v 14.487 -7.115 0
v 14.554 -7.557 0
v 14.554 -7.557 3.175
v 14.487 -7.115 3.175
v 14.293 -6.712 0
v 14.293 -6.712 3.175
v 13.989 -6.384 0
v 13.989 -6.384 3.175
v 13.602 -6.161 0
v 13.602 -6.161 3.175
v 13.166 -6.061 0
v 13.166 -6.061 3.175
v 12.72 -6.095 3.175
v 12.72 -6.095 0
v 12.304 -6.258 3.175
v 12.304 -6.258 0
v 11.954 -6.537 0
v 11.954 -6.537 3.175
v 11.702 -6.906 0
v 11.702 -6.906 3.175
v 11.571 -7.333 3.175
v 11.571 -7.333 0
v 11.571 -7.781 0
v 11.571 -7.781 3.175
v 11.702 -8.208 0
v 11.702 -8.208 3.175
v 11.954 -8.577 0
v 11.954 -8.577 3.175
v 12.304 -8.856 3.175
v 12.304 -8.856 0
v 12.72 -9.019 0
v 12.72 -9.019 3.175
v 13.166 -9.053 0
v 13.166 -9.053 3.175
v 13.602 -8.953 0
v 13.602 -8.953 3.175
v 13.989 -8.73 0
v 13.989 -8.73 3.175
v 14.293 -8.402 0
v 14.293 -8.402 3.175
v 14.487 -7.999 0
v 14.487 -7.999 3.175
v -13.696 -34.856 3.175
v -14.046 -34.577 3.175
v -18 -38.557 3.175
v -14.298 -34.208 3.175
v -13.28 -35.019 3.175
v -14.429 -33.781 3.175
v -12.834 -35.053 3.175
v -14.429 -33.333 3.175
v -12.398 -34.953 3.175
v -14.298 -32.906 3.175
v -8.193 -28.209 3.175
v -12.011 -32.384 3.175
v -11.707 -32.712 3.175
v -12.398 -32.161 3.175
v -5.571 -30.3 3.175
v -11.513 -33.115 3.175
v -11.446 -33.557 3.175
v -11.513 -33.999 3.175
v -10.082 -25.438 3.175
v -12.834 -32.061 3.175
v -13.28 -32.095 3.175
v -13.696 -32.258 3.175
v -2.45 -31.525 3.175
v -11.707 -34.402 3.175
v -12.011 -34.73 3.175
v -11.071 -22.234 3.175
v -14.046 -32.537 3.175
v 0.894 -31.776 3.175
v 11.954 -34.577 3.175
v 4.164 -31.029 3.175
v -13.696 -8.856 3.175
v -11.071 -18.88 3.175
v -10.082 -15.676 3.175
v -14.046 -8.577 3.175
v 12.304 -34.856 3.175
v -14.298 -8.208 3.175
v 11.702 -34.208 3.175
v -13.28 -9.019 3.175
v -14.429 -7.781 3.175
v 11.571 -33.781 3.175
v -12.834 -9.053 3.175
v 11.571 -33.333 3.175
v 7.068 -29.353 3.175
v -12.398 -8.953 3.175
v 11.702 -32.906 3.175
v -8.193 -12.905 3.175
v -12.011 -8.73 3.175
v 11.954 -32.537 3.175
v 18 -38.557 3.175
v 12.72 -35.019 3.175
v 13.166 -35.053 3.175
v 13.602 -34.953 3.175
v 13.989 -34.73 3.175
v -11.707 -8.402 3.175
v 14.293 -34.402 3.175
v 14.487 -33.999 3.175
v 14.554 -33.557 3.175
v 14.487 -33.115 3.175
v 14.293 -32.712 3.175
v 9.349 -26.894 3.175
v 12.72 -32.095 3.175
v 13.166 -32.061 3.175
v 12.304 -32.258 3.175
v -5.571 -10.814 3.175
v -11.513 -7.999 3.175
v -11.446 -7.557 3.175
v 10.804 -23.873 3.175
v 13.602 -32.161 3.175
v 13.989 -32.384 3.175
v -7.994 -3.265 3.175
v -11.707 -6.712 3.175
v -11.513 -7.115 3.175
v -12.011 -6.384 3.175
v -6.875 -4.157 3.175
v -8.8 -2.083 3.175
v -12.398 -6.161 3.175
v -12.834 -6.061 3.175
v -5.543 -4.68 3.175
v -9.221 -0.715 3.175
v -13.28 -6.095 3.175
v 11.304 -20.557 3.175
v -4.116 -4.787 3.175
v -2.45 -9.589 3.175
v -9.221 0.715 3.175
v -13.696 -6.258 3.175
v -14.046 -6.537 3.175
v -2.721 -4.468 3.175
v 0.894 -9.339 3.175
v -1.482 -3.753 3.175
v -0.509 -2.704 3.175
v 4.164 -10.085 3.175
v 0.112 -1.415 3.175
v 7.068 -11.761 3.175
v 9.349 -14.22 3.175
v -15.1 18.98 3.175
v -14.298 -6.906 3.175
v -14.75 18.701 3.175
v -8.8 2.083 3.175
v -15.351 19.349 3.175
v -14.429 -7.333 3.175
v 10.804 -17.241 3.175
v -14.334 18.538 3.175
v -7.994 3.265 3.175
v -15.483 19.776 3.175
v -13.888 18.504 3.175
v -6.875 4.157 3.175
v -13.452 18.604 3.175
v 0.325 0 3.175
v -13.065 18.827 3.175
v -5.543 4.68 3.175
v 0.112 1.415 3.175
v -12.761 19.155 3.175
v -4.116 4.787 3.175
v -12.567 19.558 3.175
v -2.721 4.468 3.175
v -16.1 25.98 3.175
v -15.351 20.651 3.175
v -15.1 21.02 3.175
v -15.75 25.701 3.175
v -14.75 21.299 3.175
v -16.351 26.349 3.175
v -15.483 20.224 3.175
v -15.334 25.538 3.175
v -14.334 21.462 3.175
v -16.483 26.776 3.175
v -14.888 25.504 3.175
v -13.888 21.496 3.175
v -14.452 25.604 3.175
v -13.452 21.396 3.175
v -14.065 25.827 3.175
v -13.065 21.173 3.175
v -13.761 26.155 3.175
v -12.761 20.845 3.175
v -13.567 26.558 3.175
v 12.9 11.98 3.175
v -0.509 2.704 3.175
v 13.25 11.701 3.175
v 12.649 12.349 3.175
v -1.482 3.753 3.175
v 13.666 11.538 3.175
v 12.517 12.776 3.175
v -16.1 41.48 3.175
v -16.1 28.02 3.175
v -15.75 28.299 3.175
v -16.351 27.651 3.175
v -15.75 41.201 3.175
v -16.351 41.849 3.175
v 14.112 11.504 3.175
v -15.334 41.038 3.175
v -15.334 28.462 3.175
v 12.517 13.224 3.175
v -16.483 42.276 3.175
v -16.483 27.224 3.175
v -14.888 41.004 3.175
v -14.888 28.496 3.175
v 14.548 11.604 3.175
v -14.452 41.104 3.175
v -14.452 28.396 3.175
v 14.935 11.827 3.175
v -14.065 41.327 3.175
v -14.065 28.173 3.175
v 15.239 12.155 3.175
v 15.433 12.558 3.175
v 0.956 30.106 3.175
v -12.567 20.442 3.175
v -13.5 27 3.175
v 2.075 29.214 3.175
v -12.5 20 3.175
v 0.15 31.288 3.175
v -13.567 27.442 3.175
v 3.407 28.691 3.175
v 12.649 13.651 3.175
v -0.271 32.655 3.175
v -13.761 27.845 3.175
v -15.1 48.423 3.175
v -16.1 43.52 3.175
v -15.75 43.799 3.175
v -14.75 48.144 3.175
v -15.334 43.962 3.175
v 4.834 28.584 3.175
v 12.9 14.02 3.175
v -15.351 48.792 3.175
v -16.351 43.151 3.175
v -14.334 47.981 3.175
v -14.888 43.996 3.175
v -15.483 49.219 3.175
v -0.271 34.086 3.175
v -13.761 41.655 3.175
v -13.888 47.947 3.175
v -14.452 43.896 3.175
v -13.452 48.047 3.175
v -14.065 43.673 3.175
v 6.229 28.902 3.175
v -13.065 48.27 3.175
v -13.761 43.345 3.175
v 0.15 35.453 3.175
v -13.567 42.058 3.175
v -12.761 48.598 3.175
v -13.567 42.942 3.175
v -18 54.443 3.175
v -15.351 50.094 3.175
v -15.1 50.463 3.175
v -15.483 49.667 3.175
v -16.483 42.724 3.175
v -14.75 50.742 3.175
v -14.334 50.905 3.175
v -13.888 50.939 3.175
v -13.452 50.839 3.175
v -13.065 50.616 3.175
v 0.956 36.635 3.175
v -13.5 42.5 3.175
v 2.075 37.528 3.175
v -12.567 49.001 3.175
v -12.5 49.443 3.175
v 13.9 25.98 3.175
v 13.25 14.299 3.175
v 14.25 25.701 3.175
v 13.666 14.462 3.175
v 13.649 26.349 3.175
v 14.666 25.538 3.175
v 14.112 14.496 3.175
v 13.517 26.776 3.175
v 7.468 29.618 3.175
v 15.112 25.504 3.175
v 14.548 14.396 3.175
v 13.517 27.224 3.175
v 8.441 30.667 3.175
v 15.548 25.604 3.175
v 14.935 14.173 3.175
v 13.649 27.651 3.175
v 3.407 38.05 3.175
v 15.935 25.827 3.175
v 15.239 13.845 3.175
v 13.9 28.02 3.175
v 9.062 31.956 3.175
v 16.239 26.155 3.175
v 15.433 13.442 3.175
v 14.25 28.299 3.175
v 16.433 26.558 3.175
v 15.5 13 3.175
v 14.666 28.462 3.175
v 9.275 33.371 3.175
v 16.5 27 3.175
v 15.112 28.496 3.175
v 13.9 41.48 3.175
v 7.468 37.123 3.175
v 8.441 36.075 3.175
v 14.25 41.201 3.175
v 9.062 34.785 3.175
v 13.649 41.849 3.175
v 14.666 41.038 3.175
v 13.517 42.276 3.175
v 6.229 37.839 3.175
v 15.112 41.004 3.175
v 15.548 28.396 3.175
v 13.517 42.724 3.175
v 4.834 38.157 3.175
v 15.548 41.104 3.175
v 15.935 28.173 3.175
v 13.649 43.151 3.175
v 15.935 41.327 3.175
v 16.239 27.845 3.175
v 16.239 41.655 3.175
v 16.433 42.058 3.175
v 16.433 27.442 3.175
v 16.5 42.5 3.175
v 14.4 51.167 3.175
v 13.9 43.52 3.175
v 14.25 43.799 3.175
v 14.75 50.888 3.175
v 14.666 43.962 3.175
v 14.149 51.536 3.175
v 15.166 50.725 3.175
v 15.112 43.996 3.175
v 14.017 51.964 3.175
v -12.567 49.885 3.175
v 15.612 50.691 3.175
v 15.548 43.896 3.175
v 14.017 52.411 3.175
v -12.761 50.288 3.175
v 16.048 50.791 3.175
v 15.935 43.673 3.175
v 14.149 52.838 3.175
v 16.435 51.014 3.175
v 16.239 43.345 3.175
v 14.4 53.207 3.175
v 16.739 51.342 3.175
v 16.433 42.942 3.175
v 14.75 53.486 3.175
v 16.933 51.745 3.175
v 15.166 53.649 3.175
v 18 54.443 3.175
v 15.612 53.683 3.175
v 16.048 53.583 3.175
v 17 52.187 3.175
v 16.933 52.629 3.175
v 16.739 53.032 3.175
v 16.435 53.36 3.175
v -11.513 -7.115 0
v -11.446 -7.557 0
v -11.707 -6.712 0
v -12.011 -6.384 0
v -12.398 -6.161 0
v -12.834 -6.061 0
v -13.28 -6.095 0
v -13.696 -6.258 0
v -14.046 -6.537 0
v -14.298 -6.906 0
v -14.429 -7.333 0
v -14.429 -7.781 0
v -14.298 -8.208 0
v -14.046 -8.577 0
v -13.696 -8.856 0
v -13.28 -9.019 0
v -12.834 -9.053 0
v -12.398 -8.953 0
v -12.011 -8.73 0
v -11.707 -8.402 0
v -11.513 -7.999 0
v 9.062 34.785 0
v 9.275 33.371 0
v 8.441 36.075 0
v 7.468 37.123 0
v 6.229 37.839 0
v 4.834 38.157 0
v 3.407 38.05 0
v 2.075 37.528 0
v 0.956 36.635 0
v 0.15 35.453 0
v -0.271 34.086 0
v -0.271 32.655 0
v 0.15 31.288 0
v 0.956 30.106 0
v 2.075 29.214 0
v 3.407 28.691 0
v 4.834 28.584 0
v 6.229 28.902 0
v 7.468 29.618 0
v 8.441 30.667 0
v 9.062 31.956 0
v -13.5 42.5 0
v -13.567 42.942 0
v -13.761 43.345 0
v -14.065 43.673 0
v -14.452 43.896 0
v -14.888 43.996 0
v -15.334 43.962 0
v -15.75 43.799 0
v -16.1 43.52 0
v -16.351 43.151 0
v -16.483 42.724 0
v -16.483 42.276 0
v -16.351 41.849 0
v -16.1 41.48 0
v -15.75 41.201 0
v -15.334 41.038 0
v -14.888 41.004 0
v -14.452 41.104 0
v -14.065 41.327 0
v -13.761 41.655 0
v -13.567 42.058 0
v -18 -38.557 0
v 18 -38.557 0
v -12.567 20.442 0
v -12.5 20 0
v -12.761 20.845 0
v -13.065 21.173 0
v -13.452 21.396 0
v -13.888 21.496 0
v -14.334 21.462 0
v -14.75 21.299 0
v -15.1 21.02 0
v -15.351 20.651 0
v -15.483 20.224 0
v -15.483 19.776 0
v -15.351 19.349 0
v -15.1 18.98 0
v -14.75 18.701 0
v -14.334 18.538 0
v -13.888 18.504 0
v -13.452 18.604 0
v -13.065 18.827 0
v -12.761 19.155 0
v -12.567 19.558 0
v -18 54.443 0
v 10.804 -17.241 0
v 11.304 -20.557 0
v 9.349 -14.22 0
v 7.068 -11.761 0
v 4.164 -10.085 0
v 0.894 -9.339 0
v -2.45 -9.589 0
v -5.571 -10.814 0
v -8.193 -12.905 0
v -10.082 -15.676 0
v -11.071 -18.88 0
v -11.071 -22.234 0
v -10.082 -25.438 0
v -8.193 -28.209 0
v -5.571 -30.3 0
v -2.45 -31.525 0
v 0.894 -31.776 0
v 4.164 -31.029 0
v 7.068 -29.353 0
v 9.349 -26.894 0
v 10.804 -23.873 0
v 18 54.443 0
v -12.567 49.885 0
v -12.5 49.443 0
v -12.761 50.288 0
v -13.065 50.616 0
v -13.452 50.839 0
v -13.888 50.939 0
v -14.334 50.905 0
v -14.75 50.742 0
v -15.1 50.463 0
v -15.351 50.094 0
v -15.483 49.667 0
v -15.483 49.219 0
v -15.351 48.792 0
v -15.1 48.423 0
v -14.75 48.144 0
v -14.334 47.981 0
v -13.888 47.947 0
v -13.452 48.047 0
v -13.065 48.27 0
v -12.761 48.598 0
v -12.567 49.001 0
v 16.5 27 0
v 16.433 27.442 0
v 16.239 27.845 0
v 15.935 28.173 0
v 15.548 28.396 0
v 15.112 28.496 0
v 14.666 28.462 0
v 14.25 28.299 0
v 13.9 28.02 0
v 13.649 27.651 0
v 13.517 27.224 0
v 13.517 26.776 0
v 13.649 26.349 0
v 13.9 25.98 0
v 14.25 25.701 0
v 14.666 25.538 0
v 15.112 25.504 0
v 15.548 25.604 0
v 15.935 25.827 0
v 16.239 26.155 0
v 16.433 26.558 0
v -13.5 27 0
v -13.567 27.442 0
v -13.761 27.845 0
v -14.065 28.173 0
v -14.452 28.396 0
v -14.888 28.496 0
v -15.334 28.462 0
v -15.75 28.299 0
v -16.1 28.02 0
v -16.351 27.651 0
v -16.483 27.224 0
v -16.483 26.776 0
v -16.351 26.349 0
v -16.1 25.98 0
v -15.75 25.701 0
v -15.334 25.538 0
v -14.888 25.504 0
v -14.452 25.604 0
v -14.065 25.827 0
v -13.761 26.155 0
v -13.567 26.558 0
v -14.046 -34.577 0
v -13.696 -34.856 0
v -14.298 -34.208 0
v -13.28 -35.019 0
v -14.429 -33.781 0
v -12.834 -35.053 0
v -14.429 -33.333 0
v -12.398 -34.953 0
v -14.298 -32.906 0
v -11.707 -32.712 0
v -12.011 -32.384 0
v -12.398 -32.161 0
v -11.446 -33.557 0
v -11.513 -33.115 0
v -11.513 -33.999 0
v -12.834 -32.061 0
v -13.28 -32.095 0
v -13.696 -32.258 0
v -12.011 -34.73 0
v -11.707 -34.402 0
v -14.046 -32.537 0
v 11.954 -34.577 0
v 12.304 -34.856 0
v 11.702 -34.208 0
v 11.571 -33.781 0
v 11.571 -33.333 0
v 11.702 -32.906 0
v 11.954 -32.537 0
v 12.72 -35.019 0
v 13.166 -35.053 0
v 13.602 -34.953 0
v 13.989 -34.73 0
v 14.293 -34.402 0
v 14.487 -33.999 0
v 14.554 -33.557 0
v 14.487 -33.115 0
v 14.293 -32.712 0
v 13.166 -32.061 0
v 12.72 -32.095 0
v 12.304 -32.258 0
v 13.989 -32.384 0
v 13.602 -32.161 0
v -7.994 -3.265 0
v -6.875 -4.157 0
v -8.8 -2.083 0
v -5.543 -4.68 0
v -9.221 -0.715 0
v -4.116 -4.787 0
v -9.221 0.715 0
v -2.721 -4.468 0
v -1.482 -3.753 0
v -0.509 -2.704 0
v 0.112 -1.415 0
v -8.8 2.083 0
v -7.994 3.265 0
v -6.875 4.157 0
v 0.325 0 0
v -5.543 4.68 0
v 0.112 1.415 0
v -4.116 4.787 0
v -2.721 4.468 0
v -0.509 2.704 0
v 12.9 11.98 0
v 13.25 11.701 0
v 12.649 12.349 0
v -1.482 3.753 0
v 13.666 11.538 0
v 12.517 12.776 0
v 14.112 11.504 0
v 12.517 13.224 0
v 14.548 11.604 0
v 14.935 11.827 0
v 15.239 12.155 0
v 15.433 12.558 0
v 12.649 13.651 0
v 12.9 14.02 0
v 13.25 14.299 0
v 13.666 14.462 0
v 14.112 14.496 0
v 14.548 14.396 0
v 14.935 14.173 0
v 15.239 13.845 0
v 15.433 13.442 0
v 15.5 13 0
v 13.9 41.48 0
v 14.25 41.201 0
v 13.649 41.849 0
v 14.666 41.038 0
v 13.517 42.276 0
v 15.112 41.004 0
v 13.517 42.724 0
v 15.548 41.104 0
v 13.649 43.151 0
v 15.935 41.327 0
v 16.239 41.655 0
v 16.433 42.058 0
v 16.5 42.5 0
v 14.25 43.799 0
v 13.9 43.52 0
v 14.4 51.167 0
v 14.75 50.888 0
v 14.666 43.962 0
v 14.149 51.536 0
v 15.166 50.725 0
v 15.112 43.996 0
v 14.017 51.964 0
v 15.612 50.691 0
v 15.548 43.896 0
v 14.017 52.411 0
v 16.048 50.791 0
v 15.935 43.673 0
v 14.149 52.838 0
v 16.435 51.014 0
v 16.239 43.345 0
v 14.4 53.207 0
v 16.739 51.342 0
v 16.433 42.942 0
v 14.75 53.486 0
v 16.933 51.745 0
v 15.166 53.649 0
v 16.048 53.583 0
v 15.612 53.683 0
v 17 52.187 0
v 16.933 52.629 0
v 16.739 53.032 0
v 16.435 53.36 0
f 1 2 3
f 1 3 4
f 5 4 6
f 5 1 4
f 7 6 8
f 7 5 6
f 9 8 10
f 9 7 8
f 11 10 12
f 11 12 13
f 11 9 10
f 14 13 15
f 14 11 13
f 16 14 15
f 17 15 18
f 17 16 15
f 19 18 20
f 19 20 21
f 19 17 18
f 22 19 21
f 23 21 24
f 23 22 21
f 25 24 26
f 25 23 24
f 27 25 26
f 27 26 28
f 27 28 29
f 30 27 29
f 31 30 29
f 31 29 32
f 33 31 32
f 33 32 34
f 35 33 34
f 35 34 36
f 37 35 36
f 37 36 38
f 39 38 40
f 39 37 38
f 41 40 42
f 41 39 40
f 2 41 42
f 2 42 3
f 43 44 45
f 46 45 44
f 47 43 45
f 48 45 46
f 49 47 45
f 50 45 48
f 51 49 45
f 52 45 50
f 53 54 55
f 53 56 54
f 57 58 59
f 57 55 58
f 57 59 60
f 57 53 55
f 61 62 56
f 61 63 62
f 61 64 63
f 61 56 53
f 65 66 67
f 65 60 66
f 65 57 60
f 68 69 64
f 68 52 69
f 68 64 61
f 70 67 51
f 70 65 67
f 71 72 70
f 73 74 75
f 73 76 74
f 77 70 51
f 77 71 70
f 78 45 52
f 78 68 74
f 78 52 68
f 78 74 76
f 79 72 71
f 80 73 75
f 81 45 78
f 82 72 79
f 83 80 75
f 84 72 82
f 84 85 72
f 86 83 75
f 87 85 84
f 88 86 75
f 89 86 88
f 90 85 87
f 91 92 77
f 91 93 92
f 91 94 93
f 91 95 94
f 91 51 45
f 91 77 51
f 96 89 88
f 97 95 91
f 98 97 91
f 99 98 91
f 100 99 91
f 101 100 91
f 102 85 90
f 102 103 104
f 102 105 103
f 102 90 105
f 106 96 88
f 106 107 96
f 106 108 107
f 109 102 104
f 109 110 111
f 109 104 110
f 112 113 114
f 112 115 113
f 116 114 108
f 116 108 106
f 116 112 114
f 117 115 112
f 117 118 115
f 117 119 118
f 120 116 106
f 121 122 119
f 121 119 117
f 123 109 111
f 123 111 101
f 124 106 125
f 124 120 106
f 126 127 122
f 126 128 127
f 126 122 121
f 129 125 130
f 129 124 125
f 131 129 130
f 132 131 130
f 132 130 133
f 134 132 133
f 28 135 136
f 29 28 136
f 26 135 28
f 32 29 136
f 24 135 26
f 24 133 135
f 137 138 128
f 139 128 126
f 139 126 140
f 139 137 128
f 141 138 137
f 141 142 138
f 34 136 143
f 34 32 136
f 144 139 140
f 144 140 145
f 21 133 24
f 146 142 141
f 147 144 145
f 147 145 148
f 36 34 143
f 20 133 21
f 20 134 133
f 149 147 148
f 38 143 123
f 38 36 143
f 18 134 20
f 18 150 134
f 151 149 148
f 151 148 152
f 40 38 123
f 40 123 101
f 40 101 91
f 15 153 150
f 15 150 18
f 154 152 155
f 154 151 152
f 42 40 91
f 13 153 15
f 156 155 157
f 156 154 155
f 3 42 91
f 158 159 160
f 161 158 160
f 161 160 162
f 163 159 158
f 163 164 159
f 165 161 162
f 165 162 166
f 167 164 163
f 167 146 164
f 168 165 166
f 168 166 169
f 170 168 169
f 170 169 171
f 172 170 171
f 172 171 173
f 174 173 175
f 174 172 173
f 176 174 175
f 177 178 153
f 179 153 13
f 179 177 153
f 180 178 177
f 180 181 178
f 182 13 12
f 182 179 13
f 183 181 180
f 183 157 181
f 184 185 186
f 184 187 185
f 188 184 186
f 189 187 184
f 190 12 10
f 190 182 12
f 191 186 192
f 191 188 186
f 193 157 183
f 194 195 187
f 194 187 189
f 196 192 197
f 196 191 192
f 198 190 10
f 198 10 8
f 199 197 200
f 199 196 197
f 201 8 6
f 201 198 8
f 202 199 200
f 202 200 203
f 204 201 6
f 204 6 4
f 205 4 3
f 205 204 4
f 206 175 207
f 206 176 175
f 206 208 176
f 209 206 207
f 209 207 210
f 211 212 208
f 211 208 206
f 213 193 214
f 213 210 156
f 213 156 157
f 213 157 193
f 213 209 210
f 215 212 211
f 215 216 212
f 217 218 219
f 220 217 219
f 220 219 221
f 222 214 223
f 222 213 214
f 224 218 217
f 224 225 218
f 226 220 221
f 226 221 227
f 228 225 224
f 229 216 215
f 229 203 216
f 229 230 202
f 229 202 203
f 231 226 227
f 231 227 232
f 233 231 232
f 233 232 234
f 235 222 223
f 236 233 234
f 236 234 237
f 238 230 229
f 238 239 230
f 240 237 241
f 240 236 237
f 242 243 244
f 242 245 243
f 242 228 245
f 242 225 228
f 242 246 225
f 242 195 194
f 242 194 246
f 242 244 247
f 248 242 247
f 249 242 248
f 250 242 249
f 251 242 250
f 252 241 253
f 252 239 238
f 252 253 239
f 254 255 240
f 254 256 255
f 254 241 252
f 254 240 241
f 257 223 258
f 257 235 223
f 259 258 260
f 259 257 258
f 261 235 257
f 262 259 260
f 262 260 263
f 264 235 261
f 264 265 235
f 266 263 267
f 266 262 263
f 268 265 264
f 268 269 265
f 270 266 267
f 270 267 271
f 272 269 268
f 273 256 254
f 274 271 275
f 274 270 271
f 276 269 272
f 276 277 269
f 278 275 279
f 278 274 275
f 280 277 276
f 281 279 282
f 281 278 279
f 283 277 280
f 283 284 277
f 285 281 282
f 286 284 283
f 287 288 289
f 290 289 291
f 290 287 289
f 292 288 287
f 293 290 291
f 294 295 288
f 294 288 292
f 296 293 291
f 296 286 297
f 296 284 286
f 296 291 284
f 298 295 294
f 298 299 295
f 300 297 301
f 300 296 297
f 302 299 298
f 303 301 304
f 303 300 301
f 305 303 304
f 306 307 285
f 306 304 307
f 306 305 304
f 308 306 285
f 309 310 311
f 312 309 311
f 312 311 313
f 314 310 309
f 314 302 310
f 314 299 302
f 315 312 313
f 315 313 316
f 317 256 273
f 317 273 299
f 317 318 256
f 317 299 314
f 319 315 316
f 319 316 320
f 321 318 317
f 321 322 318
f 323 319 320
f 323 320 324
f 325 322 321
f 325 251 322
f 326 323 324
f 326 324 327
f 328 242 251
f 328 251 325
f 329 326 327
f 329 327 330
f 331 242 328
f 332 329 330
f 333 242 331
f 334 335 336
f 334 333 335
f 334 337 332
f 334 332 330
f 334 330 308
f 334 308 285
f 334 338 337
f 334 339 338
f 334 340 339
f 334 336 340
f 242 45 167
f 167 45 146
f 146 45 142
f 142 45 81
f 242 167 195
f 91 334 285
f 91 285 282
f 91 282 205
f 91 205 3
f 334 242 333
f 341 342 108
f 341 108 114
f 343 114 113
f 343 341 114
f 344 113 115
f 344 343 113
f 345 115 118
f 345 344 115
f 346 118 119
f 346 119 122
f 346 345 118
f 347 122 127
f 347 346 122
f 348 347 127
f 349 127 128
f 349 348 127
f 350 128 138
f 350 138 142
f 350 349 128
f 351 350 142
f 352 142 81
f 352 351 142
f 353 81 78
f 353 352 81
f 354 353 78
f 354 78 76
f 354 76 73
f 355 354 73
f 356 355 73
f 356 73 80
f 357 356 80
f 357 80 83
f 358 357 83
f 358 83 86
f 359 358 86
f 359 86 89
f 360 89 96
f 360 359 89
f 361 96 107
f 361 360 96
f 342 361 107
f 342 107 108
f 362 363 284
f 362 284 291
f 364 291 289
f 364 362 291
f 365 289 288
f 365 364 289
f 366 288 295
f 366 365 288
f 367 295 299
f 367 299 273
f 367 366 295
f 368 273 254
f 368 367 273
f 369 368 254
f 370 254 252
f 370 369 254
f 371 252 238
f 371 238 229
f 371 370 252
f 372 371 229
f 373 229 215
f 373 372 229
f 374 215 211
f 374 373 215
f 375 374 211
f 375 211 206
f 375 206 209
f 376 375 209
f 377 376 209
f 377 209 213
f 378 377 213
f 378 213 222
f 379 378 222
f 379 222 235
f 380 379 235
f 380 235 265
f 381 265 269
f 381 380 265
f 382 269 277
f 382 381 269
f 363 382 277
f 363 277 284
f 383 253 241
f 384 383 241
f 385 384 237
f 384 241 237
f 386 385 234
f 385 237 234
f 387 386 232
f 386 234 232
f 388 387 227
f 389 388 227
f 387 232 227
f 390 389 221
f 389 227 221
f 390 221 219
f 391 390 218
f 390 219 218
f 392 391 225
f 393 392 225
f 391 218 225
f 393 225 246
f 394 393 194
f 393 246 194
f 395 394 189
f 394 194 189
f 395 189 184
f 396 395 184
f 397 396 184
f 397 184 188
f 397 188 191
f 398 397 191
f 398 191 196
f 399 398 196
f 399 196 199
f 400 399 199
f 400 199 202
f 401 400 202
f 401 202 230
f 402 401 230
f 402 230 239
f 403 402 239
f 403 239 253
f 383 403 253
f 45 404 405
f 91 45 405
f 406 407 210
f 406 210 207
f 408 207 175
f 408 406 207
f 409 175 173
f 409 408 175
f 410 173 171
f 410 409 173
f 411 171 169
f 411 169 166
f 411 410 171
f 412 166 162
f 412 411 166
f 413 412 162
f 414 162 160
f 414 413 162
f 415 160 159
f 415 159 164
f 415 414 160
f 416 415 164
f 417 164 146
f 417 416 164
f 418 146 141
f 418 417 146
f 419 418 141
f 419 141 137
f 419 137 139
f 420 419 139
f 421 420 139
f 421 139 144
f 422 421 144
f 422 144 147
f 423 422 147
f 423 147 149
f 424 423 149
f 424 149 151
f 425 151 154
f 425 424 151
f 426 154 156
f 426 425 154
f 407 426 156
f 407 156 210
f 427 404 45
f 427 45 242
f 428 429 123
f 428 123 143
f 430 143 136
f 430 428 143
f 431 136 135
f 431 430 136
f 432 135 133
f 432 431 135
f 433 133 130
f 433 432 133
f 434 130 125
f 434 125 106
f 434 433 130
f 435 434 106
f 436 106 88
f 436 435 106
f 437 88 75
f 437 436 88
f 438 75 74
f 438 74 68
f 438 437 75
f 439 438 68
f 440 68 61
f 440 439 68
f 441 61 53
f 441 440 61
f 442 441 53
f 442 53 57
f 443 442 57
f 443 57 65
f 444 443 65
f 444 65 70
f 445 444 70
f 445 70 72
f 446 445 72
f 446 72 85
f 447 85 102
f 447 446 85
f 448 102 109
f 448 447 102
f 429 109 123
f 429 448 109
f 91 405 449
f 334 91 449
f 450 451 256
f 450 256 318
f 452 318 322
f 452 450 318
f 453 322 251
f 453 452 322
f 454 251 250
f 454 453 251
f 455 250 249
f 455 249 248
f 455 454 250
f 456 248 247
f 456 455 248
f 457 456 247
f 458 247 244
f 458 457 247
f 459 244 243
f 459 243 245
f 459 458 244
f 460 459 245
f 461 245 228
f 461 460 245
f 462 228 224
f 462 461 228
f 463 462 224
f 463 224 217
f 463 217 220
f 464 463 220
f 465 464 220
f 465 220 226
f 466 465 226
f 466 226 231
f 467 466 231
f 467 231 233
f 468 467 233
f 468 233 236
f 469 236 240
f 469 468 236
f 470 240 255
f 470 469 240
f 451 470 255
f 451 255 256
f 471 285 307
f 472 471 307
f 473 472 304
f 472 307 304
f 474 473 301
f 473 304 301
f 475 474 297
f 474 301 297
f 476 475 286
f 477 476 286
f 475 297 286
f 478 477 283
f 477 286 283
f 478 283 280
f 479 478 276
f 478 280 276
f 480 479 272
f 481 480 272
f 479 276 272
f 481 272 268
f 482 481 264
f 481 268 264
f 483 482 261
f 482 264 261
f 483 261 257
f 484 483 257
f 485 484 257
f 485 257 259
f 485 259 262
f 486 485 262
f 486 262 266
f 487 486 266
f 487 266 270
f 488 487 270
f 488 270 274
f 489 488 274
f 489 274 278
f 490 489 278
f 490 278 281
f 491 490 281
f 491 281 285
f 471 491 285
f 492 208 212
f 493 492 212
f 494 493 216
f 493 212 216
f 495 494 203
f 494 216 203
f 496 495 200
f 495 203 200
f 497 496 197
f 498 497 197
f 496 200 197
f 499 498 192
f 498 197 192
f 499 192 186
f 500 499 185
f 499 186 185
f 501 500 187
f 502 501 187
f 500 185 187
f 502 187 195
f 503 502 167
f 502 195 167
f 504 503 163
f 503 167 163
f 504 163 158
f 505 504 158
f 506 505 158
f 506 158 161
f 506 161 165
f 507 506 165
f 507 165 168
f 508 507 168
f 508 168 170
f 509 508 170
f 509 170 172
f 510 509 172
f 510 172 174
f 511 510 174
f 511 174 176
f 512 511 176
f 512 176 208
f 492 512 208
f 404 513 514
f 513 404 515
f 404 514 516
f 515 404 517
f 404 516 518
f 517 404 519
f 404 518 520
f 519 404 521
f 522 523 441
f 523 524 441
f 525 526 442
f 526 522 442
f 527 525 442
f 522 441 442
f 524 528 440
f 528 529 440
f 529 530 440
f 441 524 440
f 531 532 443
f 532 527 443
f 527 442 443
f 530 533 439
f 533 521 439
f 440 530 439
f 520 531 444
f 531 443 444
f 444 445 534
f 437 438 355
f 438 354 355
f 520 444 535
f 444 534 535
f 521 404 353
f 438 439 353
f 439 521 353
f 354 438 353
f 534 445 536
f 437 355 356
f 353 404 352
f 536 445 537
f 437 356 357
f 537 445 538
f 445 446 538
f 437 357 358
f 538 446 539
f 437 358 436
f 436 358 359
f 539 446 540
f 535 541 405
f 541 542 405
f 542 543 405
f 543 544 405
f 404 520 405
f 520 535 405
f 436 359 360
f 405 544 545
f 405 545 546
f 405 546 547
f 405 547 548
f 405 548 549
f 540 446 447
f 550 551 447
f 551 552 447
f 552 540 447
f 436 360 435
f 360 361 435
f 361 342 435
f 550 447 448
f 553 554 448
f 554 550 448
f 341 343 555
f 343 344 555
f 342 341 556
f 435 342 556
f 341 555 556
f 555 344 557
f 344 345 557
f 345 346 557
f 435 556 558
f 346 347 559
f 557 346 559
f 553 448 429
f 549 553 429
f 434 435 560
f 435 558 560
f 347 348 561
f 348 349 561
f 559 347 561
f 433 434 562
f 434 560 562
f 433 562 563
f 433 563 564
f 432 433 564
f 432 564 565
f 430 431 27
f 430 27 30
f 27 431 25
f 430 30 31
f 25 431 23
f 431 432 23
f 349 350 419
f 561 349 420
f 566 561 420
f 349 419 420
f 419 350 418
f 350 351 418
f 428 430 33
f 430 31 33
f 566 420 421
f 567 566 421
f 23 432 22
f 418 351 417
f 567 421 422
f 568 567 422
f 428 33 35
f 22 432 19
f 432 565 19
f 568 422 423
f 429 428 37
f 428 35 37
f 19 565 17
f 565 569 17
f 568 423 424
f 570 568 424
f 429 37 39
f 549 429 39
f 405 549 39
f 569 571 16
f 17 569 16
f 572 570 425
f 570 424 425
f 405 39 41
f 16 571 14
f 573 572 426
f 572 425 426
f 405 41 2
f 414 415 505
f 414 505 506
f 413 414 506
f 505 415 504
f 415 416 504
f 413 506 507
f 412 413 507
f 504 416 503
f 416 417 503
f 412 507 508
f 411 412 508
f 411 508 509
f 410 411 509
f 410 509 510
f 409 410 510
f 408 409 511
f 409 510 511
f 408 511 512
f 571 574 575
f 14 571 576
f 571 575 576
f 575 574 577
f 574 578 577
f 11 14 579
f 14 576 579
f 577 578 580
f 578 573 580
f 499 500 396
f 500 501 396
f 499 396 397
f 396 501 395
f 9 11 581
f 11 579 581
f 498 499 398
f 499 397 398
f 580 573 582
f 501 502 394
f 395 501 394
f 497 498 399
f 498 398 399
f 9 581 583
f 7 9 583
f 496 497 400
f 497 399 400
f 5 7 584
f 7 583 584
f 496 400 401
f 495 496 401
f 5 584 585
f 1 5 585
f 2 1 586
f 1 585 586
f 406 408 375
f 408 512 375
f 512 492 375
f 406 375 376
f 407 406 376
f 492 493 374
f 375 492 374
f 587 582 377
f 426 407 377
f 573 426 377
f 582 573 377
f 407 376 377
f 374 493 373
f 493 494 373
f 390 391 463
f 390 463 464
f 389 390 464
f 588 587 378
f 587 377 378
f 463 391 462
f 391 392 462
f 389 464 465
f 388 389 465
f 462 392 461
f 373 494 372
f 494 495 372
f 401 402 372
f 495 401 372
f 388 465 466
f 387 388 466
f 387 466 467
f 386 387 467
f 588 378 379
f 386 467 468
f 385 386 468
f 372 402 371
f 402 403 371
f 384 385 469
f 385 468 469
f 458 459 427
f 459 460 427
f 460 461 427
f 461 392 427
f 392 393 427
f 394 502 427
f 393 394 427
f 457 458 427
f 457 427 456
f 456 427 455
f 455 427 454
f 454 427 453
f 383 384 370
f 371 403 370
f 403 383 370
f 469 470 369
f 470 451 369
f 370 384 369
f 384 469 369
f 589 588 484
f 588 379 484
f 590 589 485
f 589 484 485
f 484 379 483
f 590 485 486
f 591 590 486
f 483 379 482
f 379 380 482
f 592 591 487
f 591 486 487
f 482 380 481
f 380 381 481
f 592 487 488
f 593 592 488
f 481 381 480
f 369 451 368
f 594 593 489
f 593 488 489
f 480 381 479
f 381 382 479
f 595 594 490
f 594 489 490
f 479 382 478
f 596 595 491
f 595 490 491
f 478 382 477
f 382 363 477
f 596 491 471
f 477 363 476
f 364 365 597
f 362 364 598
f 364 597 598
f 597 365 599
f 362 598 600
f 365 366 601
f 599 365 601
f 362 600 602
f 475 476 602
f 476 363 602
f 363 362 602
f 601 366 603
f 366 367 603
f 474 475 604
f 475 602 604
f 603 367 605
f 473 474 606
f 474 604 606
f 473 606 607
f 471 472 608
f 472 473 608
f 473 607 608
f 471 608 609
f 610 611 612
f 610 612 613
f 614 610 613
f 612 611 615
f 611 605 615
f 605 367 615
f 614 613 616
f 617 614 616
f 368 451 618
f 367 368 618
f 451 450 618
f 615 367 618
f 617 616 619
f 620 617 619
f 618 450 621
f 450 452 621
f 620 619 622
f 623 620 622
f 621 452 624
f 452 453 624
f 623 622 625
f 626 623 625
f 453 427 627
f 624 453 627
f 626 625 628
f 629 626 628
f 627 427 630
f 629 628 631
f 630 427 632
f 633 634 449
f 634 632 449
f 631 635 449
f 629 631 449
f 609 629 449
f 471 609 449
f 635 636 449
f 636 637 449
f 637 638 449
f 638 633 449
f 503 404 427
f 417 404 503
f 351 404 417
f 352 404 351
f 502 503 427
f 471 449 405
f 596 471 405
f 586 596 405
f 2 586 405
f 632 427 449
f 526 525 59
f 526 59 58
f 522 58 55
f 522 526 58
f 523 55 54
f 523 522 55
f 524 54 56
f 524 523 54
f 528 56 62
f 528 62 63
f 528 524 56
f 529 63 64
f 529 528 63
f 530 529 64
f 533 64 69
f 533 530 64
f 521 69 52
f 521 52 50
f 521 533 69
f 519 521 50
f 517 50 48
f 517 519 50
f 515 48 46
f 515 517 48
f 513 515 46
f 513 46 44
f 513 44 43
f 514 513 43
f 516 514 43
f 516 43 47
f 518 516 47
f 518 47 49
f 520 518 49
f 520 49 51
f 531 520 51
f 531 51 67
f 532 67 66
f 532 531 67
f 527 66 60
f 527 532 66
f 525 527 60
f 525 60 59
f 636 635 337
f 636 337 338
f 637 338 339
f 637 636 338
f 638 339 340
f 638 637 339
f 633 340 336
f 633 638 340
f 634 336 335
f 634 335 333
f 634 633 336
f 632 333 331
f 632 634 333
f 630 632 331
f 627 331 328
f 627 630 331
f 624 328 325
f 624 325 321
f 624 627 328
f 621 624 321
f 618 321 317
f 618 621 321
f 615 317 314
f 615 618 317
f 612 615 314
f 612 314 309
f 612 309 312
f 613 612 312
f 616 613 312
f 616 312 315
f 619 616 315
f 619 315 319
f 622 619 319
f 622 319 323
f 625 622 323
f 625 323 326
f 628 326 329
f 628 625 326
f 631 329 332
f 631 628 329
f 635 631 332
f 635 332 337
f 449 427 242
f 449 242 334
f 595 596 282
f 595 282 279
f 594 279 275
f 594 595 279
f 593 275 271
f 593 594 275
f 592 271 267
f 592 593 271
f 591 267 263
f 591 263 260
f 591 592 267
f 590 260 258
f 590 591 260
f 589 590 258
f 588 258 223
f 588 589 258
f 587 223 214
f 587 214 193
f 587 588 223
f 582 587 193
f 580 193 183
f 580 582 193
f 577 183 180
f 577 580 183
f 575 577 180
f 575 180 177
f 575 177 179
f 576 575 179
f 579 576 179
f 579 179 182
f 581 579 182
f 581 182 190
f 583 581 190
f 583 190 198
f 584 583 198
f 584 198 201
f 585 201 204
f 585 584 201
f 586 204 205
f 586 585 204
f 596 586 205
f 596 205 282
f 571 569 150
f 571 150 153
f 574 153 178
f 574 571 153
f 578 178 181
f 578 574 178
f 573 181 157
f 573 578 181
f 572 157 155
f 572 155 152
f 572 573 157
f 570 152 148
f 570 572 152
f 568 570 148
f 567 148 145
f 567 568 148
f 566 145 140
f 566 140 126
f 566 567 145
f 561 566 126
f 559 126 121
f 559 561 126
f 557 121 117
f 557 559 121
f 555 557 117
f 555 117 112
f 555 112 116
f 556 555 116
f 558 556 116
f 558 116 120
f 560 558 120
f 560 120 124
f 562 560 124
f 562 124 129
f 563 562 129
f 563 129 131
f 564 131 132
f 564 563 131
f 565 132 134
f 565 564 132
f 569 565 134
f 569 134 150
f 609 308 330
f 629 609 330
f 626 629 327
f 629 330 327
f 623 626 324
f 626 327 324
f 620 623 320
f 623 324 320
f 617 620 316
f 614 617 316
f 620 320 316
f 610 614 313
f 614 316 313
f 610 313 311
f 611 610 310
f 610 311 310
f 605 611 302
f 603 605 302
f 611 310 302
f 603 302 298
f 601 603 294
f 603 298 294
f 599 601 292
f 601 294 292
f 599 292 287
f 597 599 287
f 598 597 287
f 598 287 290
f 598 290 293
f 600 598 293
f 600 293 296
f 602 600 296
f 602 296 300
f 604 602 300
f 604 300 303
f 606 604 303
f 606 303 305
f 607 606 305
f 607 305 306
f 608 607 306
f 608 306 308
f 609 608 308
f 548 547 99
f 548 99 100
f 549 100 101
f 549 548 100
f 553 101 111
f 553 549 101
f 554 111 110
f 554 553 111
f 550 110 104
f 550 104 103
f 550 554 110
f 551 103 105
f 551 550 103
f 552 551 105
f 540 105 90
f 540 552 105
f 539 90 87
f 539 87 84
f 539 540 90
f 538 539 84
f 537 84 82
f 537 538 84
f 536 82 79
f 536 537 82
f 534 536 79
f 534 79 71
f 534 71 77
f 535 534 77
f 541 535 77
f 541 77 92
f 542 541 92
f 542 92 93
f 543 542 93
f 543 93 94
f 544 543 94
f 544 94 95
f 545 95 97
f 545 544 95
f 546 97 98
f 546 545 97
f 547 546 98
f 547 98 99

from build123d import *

# Parameters (mm, degrees)
SKETCH2_W           = 36
SKETCH2_H           = 93
SKETCH2_R           = 1.5
SKETCH2_R_2         = 11.25
SKETCH2_R_3         = 4.8
BOSS_EXTRUDE1_DEPTH = 3.175
SKETCH3_R           = 1.5
CUT_EXTRUDE1_DEPTH  = 16


with BuildPart() as part:
    # Sketch2 → Boss-Extrude1 (new body)
    with BuildSketch(Plane.XY):
        with Locations((0, 7.942942894)):
            Rectangle(SKETCH2_W, SKETCH2_H)
        with Locations((13.053786058, -33.557057106)):
            Circle(SKETCH2_R, mode=Mode.SUBTRACT)
        with Locations((13.053786058, -7.557057106)):
            Circle(SKETCH2_R, mode=Mode.SUBTRACT)
        with Locations((-12.946213942, -33.557057106)):
            Circle(SKETCH2_R, mode=Mode.SUBTRACT)
        with Locations((-12.946213942, -7.557057106)):
            Circle(SKETCH2_R, mode=Mode.SUBTRACT)
        with Locations((0.053786058, -20.557057106)):
            Circle(SKETCH2_R_2, mode=Mode.SUBTRACT)
        with Locations((-4.475, 0)):
            Circle(SKETCH2_R_3, mode=Mode.SUBTRACT)
        with Locations((4.475, 33.370645783)):
            Circle(SKETCH2_R_3, mode=Mode.SUBTRACT)
        with Locations((14, 13)):
            Circle(SKETCH2_R, mode=Mode.SUBTRACT)
        with Locations((-14, 20)):
            Circle(SKETCH2_R, mode=Mode.SUBTRACT)
        with Locations((-14, 49.442942894)):
            Circle(SKETCH2_R, mode=Mode.SUBTRACT)
        with Locations((15.5, 52.187088466)):
            Circle(SKETCH2_R, mode=Mode.SUBTRACT)
    extrude(amount=BOSS_EXTRUDE1_DEPTH)

    # Sketch3 → Cut-Extrude1 (cut)
    with BuildSketch(Plane.XY.offset(3.175)):
        with Locations((-15, 42.5)):
            Circle(SKETCH3_R)
        with Locations((15, 42.5)):
            Circle(SKETCH3_R)
        with Locations((-15, 27)):
            Circle(SKETCH3_R)
        with Locations((15, 27)):
            Circle(SKETCH3_R)
    extrude(amount=-CUT_EXTRUDE1_DEPTH, mode=Mode.SUBTRACT)


solid = part.part
